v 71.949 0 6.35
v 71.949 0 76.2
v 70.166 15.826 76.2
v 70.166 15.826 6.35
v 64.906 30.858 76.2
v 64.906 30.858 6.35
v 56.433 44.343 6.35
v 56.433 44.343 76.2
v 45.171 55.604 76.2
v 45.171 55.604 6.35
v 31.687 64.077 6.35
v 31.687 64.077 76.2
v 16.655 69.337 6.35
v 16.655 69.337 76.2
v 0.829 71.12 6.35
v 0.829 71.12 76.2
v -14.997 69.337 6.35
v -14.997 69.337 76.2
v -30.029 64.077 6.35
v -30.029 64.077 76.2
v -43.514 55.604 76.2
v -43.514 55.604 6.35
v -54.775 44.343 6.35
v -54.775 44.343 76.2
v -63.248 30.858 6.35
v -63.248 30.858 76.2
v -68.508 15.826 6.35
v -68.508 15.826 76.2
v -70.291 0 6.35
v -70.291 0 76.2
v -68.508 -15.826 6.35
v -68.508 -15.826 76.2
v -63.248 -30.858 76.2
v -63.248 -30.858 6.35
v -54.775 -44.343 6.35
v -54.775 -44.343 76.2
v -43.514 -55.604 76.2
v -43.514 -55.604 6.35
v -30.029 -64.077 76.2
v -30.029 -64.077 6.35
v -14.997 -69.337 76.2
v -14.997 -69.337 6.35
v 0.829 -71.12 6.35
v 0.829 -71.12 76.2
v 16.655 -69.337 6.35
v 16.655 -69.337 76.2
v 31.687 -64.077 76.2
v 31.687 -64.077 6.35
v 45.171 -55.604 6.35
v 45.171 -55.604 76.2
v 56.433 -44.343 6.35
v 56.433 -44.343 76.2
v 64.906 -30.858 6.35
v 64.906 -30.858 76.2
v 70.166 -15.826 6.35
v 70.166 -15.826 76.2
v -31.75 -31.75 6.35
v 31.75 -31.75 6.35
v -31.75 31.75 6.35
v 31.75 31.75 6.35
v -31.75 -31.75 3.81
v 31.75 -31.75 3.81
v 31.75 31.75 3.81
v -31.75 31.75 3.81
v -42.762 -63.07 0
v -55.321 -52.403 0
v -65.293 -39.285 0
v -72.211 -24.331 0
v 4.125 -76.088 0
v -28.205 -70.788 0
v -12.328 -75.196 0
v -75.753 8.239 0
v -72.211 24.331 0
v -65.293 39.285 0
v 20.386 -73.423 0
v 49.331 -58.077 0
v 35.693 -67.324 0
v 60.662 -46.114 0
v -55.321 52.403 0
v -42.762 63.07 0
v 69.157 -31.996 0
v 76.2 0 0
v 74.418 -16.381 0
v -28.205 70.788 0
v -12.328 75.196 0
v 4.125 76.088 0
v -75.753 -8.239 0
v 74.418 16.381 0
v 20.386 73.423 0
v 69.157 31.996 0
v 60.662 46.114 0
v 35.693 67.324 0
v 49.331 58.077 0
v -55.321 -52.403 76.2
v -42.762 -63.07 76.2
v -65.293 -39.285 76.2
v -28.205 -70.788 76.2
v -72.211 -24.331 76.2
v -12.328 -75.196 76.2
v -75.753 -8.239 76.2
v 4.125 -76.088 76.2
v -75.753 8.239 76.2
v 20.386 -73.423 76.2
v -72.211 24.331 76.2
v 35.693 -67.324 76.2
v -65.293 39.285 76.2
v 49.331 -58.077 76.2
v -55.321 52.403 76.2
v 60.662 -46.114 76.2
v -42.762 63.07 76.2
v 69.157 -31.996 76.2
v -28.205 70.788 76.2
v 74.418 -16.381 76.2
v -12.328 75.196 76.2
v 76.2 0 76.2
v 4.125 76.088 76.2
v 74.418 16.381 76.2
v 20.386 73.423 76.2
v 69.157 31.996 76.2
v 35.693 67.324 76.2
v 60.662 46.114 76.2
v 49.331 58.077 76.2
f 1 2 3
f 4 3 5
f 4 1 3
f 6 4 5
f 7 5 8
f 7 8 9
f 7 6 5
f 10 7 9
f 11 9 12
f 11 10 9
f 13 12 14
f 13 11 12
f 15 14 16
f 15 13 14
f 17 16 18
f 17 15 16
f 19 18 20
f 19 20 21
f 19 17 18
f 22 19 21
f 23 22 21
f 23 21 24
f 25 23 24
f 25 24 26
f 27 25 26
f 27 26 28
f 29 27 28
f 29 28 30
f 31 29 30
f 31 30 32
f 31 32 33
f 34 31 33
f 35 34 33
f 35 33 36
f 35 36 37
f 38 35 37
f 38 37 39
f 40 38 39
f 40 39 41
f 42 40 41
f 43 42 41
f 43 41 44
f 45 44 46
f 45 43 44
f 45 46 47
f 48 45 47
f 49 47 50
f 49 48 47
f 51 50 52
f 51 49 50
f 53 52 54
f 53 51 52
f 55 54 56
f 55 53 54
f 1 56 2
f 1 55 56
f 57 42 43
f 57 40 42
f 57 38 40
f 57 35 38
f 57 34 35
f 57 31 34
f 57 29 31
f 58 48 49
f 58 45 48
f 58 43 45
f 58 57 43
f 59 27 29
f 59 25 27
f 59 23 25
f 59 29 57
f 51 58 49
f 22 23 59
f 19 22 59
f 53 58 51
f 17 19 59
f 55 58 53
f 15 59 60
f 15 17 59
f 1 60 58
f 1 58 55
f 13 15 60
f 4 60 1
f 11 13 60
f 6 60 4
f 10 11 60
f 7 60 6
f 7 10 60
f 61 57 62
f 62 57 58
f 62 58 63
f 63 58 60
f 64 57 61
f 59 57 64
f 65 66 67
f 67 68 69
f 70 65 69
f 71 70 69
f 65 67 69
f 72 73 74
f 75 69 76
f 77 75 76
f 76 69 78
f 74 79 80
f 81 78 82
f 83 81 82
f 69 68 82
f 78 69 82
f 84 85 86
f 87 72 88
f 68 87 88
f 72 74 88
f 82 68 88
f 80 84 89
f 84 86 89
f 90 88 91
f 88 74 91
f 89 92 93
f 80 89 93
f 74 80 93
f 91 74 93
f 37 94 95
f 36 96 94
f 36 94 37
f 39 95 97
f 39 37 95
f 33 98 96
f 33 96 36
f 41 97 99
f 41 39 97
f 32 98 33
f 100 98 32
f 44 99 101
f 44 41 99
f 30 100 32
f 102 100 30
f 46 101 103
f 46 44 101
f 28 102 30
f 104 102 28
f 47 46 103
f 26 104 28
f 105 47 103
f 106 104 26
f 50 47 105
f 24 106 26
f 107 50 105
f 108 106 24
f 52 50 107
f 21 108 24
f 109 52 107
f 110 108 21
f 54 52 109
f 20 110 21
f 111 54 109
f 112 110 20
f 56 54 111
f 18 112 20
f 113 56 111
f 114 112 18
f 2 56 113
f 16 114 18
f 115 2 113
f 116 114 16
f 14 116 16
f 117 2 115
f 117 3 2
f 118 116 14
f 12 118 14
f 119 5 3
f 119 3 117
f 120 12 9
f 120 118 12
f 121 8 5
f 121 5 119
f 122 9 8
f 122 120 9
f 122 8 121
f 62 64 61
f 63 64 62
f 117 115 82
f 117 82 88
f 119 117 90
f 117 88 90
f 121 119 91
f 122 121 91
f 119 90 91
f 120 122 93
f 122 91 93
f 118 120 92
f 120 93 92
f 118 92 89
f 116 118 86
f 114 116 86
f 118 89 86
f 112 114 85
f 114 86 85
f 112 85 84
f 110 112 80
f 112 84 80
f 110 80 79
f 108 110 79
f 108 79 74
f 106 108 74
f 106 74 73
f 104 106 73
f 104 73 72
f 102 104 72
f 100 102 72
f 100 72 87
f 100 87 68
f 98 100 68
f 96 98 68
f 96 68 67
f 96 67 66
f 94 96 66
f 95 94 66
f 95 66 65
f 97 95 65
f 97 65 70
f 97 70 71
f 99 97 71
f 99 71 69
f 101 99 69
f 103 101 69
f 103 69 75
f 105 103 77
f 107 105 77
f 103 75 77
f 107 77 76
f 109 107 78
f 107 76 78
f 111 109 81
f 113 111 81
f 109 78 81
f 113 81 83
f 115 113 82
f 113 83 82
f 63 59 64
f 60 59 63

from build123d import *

# Parameters (mm, degrees)
SKETCH1_R           = 76.2
SKETCH1_R_2         = 71.12
BOSS_EXTRUDE1_DEPTH = 76.2
SKETCH3_R           = 76.2
BOSS_EXTRUDE2_DEPTH = 6.35
SKETCH4_W           = 63.5
SKETCH4_H           = 63.5
CUT_EXTRUDE1_DEPTH  = 2.54


with BuildPart() as part:
    # Sketch1 → Boss-Extrude1 (new body)
    with BuildSketch(Plane.XY):
        Circle(SKETCH1_R)
        with Locations((0.828825483, 0)):
            Circle(SKETCH1_R_2, mode=Mode.SUBTRACT)
    extrude(amount=BOSS_EXTRUDE1_DEPTH)

    # Sketch3 → Boss-Extrude2 (add)
    with BuildSketch(Plane.XY):
        Circle(SKETCH3_R)
    extrude(amount=BOSS_EXTRUDE2_DEPTH)

    # Sketch4 → Cut-Extrude1 (cut)
    with BuildSketch(Plane.XY.offset(6.35)):
        Rectangle(SKETCH4_W, SKETCH4_H)
    extrude(amount=-CUT_EXTRUDE1_DEPTH, mode=Mode.SUBTRACT)


solid = part.part
